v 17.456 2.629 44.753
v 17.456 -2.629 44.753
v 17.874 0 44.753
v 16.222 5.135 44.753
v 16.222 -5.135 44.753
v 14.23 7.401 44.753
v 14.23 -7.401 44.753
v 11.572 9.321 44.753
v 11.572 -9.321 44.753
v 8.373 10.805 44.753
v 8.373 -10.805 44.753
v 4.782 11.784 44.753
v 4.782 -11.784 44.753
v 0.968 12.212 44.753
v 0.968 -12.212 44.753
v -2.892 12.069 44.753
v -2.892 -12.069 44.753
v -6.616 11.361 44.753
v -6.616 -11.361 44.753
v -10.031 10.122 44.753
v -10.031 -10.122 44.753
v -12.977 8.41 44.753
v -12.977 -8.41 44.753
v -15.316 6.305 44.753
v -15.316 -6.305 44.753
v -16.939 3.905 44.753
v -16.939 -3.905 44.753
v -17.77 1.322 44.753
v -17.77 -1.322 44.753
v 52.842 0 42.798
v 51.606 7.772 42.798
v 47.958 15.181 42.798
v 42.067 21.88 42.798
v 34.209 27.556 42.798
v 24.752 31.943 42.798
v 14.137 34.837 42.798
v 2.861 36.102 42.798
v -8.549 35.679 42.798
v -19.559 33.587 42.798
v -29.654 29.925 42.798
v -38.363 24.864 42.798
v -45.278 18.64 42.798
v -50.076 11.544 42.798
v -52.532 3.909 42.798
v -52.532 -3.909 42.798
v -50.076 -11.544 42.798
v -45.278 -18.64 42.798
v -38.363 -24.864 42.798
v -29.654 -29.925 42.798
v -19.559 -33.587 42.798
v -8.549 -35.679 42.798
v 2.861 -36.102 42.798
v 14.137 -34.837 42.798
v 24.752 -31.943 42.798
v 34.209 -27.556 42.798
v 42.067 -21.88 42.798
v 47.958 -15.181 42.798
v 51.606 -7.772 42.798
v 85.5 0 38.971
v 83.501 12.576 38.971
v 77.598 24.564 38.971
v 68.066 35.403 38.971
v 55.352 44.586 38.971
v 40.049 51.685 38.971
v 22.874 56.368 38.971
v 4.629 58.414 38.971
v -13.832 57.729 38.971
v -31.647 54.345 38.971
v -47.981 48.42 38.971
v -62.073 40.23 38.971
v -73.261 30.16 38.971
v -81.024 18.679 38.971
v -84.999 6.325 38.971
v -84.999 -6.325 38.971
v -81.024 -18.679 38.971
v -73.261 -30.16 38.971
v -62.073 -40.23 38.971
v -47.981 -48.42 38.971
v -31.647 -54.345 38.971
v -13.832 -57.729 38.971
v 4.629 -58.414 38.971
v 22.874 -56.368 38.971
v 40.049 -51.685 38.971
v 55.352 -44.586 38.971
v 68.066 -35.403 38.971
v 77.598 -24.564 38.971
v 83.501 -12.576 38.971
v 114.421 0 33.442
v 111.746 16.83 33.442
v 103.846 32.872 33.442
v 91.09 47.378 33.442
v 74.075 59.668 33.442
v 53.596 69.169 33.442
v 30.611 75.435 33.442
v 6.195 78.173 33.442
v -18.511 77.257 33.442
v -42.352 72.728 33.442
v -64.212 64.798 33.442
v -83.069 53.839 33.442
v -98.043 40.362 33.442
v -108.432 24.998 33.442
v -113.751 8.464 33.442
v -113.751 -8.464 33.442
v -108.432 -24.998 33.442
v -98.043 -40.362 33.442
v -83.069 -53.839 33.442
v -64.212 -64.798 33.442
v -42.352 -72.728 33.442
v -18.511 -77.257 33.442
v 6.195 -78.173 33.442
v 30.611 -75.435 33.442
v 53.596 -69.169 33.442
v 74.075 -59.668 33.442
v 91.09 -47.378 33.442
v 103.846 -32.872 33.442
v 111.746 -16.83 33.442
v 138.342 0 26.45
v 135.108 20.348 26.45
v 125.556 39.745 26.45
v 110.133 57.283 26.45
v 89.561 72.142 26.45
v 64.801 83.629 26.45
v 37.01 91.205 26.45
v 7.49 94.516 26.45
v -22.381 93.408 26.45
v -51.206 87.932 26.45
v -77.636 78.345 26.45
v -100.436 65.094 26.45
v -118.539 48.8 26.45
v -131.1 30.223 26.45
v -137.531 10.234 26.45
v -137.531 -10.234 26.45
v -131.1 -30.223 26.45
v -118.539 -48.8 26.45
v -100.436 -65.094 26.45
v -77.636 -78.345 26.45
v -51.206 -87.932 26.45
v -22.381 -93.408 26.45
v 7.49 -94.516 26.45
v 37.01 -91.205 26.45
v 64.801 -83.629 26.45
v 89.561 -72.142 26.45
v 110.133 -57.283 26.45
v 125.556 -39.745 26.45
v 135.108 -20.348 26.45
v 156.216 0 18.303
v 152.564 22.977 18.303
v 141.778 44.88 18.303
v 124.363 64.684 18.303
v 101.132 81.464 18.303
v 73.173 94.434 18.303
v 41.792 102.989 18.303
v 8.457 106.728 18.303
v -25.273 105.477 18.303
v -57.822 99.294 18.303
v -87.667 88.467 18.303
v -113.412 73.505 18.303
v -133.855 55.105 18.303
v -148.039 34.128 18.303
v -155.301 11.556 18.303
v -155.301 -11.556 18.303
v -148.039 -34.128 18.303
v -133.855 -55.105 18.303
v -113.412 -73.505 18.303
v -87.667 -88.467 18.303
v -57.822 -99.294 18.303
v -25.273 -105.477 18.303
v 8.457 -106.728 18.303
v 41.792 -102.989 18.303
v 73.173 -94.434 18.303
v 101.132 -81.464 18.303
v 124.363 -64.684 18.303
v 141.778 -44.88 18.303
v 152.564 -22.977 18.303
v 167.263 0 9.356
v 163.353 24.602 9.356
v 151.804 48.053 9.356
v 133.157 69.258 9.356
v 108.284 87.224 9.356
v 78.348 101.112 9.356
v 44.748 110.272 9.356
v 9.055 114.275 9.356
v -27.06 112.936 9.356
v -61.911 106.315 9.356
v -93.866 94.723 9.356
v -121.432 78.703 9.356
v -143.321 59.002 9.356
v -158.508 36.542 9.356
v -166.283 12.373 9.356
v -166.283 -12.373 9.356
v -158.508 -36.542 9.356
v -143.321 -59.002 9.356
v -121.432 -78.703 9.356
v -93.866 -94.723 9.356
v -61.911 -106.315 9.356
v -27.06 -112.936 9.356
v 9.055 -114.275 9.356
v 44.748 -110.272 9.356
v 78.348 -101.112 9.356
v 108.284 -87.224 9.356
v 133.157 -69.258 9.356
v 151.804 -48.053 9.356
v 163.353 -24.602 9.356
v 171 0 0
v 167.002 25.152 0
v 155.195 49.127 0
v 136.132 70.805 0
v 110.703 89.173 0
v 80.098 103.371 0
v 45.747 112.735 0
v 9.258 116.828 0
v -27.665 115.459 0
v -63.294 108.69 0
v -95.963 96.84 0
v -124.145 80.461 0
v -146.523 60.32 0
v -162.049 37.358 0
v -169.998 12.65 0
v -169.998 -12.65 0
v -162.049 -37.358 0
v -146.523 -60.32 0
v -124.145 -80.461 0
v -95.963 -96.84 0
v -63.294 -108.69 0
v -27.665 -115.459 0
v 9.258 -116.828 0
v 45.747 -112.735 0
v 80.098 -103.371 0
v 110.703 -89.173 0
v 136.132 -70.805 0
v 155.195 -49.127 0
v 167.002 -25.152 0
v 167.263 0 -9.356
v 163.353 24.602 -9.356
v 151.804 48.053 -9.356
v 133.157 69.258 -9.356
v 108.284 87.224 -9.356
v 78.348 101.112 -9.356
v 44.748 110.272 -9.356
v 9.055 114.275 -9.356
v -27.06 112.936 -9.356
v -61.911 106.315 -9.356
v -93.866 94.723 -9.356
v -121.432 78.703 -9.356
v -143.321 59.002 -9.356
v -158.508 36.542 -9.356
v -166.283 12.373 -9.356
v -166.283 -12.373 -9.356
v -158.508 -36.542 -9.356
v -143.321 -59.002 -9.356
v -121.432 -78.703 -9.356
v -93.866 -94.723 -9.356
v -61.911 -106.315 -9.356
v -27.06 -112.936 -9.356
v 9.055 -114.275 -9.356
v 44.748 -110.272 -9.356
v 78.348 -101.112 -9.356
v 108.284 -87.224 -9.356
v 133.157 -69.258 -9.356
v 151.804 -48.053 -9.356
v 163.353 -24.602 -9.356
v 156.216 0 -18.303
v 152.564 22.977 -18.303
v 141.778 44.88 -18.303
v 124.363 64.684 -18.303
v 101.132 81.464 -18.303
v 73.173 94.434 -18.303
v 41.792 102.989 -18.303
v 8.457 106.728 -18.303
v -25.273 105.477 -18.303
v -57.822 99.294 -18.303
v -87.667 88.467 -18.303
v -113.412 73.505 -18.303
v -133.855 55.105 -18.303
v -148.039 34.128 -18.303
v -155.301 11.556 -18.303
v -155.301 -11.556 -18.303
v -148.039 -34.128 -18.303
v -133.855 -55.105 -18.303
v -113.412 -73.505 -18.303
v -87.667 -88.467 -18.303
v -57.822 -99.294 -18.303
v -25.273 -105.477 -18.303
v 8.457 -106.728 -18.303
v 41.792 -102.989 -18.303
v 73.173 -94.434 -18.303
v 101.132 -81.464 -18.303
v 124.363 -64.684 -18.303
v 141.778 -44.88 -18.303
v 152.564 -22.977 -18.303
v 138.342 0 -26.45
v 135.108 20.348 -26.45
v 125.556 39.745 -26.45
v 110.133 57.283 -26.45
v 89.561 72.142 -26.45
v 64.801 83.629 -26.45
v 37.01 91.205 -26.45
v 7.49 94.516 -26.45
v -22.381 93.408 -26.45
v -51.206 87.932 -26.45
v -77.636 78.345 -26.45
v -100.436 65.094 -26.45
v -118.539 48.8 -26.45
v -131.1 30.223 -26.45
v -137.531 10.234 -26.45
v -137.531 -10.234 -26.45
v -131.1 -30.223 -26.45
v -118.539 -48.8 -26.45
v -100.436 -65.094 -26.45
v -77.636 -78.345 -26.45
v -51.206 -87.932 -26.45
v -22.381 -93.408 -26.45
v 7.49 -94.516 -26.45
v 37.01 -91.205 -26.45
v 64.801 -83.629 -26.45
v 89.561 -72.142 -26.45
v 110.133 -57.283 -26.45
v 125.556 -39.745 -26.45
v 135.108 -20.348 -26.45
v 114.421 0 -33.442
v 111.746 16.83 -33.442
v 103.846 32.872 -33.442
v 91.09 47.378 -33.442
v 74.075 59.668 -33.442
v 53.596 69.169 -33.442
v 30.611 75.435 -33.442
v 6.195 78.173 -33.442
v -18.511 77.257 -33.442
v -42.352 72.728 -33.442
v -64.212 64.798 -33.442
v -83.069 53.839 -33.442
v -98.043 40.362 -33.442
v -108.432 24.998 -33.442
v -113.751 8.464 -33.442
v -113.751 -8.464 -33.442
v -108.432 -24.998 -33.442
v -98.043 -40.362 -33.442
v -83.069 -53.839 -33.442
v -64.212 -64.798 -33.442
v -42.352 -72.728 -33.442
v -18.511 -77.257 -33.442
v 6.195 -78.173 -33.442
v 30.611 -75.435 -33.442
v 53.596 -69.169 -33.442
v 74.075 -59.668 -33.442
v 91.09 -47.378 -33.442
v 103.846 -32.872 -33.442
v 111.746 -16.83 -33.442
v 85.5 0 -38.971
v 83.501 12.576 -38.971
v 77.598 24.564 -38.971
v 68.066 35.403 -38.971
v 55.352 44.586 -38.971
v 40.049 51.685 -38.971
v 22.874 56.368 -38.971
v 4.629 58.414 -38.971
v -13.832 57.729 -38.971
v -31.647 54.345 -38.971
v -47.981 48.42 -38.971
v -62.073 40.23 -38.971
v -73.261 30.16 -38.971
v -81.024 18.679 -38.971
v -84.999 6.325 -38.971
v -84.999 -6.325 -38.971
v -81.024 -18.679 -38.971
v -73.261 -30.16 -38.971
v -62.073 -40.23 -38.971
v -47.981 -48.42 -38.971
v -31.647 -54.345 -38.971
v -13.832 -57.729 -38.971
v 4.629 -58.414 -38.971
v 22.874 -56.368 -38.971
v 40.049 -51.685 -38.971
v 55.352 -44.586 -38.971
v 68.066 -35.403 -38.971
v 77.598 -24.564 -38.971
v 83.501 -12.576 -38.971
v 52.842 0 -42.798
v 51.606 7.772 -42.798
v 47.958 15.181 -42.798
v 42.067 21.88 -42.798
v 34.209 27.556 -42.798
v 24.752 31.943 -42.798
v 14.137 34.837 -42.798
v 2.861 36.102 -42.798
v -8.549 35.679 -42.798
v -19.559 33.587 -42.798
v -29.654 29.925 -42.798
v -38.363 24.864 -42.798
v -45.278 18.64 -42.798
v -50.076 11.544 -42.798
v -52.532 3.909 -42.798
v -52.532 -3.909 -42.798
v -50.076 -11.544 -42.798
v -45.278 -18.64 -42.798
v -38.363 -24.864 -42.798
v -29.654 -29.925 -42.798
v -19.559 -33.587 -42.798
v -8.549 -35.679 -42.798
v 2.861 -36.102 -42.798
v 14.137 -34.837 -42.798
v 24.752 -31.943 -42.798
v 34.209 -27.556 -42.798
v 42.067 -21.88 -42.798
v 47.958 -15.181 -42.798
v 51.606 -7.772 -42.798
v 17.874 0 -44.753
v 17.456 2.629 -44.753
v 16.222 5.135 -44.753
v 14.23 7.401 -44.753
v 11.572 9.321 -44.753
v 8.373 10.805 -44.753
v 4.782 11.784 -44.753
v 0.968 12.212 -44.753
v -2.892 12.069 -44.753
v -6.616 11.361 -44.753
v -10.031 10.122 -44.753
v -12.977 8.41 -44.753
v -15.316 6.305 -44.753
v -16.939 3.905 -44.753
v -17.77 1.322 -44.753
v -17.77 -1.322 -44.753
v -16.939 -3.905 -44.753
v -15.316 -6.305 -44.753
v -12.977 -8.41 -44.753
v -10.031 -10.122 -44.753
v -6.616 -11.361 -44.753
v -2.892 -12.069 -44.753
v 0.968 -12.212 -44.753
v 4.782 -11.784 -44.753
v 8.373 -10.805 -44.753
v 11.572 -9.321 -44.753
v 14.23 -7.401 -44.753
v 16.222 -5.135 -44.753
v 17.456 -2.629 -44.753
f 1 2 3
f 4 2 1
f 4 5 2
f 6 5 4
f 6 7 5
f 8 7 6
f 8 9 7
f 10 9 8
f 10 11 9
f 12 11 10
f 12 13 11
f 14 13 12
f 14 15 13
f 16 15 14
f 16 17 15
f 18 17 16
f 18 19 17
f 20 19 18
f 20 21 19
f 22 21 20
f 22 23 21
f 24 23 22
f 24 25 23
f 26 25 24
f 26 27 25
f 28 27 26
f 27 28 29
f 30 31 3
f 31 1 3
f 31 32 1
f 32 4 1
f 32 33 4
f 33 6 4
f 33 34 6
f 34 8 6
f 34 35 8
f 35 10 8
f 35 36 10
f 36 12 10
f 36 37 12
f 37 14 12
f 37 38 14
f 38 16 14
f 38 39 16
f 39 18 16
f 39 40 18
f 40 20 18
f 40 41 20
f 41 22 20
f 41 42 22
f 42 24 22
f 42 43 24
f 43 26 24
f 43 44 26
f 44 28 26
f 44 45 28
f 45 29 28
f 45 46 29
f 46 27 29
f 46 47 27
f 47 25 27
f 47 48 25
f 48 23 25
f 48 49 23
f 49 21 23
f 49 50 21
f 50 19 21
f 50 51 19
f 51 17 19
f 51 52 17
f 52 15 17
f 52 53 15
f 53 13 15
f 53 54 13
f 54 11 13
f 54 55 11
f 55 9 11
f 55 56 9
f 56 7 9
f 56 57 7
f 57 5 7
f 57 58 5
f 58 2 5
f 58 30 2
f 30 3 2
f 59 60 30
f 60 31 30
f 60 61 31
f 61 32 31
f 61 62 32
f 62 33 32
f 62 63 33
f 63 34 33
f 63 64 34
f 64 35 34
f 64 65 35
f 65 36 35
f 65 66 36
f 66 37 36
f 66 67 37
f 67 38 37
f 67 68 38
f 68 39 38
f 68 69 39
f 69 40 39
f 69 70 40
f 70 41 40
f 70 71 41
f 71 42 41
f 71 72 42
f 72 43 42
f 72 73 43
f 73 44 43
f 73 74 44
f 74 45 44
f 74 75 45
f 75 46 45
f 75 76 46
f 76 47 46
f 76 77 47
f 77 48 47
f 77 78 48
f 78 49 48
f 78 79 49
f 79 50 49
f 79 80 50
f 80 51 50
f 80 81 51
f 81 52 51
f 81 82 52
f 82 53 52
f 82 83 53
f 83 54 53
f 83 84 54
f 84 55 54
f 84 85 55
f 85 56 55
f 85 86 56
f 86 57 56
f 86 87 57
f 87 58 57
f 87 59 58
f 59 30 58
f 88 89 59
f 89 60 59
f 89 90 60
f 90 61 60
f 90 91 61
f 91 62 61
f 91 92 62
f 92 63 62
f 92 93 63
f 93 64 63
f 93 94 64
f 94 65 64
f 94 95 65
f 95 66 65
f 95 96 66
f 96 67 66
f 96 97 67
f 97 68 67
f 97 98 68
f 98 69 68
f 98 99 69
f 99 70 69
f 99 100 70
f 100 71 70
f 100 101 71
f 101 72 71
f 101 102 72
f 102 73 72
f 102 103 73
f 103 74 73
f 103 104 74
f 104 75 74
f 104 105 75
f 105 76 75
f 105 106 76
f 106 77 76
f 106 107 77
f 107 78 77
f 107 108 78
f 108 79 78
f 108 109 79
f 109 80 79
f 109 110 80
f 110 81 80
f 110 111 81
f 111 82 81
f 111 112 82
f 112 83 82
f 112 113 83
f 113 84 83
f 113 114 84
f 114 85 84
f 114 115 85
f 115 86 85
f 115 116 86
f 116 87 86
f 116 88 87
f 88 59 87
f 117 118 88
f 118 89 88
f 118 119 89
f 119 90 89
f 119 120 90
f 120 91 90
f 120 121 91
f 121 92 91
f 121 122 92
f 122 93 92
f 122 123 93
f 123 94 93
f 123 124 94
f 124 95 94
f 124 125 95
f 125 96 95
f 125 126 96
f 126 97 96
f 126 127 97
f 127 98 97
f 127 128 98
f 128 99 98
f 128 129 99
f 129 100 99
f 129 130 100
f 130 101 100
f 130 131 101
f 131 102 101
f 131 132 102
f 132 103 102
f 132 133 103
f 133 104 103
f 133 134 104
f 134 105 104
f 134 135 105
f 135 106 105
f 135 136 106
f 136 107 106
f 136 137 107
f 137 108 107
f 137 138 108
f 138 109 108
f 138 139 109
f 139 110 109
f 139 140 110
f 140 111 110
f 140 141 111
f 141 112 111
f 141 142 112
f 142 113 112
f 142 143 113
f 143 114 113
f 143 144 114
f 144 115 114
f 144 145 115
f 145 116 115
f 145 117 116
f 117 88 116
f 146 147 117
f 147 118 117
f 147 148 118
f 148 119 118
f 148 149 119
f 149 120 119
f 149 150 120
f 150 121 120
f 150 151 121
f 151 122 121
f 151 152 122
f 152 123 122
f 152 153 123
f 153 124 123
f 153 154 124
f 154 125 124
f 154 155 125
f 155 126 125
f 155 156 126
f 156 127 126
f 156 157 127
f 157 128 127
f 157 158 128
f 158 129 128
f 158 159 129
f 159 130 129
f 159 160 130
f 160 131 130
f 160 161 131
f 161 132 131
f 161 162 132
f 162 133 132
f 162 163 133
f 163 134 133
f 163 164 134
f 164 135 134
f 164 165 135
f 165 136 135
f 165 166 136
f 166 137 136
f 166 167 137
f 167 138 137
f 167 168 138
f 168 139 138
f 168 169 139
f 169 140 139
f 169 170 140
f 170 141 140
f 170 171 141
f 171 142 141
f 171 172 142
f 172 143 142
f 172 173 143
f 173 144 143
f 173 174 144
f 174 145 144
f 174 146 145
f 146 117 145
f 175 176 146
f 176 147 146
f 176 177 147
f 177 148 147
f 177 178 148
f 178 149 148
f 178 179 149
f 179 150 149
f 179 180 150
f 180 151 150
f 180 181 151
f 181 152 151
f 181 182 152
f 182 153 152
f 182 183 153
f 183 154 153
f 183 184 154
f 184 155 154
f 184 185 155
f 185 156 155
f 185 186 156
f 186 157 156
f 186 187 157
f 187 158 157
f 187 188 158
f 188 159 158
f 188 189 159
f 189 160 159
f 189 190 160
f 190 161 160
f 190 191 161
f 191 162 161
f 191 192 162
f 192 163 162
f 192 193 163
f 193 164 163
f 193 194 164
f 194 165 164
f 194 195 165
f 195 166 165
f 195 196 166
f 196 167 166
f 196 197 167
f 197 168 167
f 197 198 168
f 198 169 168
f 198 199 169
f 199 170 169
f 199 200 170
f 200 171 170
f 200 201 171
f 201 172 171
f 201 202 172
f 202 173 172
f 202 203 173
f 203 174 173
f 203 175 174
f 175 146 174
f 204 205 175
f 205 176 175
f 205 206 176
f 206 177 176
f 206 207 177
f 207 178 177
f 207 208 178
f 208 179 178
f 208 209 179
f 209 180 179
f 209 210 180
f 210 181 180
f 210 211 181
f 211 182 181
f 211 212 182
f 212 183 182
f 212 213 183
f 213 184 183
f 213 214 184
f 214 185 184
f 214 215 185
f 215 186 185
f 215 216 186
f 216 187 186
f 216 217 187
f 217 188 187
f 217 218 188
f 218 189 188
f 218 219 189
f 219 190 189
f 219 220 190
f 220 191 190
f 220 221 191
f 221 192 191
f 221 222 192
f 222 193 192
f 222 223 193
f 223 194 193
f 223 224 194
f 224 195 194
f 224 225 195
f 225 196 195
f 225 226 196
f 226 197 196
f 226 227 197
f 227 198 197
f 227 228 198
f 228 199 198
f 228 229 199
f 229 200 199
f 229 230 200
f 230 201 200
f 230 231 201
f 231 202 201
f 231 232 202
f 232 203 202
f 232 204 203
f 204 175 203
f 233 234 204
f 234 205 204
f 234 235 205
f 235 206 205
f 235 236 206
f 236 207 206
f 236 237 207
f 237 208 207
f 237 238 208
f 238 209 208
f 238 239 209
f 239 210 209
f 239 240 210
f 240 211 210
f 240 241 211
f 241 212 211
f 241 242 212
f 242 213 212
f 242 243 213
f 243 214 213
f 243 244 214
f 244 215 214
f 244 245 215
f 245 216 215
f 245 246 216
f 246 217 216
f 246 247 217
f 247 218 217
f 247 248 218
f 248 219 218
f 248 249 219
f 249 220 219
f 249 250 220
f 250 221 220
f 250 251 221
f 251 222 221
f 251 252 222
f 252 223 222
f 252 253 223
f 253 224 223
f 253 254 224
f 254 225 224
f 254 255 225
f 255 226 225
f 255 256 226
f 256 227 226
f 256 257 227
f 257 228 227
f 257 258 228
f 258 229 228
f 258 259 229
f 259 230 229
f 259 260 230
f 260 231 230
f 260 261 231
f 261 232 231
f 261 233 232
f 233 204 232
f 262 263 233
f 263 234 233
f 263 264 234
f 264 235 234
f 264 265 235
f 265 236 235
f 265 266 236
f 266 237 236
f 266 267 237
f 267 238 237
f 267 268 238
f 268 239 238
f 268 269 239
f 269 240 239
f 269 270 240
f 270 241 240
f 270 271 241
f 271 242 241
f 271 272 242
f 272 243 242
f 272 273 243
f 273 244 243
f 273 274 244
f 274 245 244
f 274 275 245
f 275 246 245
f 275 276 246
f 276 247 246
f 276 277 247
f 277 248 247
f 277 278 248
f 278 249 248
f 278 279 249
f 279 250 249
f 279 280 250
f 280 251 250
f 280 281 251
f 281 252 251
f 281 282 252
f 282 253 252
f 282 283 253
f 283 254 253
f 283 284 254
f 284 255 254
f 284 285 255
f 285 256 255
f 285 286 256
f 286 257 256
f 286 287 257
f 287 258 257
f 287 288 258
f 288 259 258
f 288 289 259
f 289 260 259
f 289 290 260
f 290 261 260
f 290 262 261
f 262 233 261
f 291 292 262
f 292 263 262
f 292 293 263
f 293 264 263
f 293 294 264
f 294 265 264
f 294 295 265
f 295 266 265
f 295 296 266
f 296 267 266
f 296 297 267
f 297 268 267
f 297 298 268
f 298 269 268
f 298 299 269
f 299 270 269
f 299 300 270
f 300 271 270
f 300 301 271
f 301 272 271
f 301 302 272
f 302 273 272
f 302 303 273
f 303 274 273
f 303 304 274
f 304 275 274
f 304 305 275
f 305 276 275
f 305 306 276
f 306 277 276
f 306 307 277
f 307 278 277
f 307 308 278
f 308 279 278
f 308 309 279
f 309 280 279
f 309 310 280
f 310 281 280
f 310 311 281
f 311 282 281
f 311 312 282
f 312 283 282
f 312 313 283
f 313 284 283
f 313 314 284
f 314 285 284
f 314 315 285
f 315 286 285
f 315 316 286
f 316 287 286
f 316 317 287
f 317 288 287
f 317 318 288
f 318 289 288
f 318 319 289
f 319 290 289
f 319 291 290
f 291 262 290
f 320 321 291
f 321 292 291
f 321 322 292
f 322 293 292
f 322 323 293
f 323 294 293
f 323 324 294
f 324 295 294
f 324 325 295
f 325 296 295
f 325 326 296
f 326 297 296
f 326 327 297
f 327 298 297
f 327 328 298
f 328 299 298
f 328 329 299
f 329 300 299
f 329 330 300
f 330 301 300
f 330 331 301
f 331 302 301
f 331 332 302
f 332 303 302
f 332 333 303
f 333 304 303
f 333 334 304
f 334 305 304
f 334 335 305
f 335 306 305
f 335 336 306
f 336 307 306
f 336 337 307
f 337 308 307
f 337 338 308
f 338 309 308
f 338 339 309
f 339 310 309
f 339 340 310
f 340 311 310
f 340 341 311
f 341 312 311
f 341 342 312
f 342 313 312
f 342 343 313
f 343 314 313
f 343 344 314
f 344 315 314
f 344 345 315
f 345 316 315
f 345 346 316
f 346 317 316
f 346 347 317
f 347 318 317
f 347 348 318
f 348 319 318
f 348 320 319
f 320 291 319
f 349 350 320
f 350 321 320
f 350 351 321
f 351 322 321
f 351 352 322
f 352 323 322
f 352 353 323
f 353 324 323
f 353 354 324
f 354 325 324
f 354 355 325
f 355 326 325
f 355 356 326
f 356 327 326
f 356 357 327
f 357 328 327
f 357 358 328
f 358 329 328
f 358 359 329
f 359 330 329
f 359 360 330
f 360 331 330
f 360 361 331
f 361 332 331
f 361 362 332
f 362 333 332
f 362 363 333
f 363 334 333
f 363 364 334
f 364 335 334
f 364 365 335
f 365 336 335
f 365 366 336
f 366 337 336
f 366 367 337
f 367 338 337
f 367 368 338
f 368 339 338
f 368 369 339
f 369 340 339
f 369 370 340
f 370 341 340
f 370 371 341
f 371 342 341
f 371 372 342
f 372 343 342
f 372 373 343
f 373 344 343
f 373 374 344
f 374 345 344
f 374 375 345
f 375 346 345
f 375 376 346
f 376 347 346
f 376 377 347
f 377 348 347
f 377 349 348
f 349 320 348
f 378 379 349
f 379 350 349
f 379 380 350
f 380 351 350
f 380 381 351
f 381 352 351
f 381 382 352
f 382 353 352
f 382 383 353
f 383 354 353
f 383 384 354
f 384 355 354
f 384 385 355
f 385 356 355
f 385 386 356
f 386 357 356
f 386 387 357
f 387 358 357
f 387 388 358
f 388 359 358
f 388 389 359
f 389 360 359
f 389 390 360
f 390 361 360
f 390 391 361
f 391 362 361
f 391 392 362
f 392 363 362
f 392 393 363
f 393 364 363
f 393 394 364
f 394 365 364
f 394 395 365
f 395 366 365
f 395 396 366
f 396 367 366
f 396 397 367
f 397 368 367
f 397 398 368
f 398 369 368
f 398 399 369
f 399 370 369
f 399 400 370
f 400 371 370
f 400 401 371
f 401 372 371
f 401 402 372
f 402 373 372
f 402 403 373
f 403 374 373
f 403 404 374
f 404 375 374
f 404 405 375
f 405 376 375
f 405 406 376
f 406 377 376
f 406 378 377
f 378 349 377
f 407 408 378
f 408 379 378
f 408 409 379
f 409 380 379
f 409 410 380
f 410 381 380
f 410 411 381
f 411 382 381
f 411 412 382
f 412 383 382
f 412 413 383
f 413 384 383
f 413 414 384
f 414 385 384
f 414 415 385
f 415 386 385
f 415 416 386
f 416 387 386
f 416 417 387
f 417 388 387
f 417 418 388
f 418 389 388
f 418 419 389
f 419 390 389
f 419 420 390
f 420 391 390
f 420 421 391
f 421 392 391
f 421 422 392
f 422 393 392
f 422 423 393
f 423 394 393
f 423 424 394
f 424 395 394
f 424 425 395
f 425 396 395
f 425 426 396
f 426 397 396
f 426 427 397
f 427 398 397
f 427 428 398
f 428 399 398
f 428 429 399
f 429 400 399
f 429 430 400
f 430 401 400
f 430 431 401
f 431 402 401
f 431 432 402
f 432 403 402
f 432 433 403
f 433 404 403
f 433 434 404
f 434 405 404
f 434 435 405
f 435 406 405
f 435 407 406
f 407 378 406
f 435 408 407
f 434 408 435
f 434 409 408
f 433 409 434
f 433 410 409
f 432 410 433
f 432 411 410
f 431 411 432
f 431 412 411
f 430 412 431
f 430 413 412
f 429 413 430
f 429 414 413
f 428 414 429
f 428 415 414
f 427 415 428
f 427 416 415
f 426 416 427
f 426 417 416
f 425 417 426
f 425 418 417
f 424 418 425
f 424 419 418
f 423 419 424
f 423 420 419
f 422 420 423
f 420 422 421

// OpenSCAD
// Generated by SolidPython 1.0.1 on 2020-07-29 00:46:54


scale(v = [19, 13, 5]) {
	sphere(r = 9);
}
/***********************************************
*********      SolidPython code:      **********
************************************************
 
# import packages: SolidPython
from solid import *
from solid.utils import *
from itertools import chain, combinations, permutations


class Resize:

    def __init__(self, scad_file):
        self.scad_file = scad_file
        #self.scad_file = import_scad(scad_file)
        # cone/cylinder param:
        self.r1 = 0
        self.r2 = 0
        self.h = 0
        # rectangular prism param:
        self.w = 0
        self.l = 0
        # ellipse param:
        self.r = 0

    # import OpenScad code (file name corresponds to shape)


    # classify shape + parameters
    def assign(self, param1, param2, param3):
        if self.scad_file == 'cone.scad':
            self.r1 = param1
            self.r2 = param2
            self.h = param3
        elif self.scad_file == 'cylinder.scad':
            self.r1 = param1
            self.r2 = param2
            self.h = param3
        elif self.scad_file == 'rectangularPrism.scad':
            self.h = param1
            self.l = param2
            self.w = param3
        else:
            self.r = param1
            self.h = param2

    # resize parameters
    def iterate(self):
        x = range(3, 20, 2)
        i = 1
        if self.scad_file == 'cone.scad':
            tempList = list(permutations(x, 2))
            for temp in tempList:
                param1 = temp[0]
                param2 = temp[1]
                filepath = 'produced_scad_files/' + 'cone' + str(param1) + '_' + str(param2) + '_' + '.scad'
                scad_render_to_file(cylinder(h=param1, r1=param2, r2=0), filepath)

        elif self.scad_file == 'cylinder.scad':
            tempList = list(permutations(x, 3))
            for temp in tempList:
                param1 = temp[0]
                param2 = temp[1]
                filepath = 'produced_scad_files/' + 'cylinder' + str(param1) + '_' + str(param2) + '_' + '.scad'
                scad_render_to_file(cylinder(h=param1, r1=param2, r2=param2), filepath)

        elif self.scad_file == 'rectangularPrism.scad':
            tempList = list(permutations(x, 3))
            for temp in tempList:
                param1 = temp[0]
                param2 = temp[1]
                param3 = temp[2]
                filepath = 'produced_scad_files/' + 'rectangularPrism' + str(param1) + '_' + str(param2) + '_' + str(
                    param3) + '.scad'
                scad_render_to_file(cube(size=(param1, param2, param3)), filepath)

        elif self.scad_file == 'ellipse.scad':
            tempList = list(permutations(x, 4))
            for temp in tempList:
                param1 = temp[0]
                param2 = temp[1]
                param3 = temp[2]
                param4 = temp[3]
                filepath = 'produced_scad_files/' + 'ellipse' + str(param1) + '_' + str(param2) + '_' + str(param3) + '_' + str(param4) + '.scad'
                scad_render_to_file(scale([param1, param2, param3])(sphere(r=param4)), filepath)

    def render_to_scadfile(self):
        scad_render_to_file(scad, 'example.scad') 
 
************************************************/
